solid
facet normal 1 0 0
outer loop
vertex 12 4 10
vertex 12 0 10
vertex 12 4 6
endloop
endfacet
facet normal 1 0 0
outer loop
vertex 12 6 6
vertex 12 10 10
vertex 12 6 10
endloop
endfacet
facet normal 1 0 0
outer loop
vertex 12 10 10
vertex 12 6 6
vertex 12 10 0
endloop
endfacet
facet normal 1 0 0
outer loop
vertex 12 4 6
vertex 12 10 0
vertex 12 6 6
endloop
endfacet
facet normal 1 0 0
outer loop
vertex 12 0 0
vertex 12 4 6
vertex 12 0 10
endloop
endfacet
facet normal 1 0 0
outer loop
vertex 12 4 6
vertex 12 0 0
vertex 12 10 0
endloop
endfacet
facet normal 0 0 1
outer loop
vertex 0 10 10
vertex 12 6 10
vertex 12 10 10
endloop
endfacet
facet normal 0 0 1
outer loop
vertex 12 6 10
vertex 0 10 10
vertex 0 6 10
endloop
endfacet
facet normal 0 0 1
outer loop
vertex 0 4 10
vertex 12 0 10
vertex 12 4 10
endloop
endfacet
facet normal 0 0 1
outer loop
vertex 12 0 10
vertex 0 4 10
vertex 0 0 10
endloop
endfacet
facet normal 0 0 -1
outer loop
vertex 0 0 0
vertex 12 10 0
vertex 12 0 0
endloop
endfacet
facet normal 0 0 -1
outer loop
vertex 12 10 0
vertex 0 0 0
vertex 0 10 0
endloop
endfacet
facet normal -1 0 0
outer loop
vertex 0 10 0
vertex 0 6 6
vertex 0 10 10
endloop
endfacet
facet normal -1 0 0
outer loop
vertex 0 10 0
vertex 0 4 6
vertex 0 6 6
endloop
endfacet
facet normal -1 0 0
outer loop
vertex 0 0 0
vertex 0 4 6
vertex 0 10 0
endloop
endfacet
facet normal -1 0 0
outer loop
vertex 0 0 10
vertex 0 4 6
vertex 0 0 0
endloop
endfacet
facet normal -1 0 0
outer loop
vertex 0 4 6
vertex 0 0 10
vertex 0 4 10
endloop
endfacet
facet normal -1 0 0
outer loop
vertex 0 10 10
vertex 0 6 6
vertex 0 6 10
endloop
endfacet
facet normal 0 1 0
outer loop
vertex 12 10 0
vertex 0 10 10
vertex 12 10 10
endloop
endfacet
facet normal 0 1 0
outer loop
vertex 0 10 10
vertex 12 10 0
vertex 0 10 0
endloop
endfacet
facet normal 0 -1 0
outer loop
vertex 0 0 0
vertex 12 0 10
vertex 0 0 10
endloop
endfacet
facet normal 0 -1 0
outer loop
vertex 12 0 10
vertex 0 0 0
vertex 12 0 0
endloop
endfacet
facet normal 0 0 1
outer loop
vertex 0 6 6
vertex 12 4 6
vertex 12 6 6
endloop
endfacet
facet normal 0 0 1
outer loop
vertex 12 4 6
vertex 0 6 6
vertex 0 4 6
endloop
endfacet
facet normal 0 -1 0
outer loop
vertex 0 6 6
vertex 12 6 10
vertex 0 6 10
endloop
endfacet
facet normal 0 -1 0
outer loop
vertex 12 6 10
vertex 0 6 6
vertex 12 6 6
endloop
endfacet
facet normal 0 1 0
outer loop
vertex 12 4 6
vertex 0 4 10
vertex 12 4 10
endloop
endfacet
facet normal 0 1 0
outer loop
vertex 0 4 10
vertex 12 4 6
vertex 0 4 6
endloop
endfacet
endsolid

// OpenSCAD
$fn = 32;

// ----------------------------------------------------------------------
// Micro clip: slotted block, 5-20 mm class
// ----------------------------------------------------------------------

// --- parameters (mm) ---
block_l = 12;             // block length, X
block_w = 10;             // block width, Y
block_h = 10;             // block height, Z
slot_w = 2;               // slot width
slot_d = 4;               // slot depth from the top

difference() {
  cube([block_l, block_w, block_h]);
  translate([-1, block_w / 2 - slot_w / 2, block_h - slot_d])
    cube([block_l + 2, slot_w, slot_d + 1]);
}
